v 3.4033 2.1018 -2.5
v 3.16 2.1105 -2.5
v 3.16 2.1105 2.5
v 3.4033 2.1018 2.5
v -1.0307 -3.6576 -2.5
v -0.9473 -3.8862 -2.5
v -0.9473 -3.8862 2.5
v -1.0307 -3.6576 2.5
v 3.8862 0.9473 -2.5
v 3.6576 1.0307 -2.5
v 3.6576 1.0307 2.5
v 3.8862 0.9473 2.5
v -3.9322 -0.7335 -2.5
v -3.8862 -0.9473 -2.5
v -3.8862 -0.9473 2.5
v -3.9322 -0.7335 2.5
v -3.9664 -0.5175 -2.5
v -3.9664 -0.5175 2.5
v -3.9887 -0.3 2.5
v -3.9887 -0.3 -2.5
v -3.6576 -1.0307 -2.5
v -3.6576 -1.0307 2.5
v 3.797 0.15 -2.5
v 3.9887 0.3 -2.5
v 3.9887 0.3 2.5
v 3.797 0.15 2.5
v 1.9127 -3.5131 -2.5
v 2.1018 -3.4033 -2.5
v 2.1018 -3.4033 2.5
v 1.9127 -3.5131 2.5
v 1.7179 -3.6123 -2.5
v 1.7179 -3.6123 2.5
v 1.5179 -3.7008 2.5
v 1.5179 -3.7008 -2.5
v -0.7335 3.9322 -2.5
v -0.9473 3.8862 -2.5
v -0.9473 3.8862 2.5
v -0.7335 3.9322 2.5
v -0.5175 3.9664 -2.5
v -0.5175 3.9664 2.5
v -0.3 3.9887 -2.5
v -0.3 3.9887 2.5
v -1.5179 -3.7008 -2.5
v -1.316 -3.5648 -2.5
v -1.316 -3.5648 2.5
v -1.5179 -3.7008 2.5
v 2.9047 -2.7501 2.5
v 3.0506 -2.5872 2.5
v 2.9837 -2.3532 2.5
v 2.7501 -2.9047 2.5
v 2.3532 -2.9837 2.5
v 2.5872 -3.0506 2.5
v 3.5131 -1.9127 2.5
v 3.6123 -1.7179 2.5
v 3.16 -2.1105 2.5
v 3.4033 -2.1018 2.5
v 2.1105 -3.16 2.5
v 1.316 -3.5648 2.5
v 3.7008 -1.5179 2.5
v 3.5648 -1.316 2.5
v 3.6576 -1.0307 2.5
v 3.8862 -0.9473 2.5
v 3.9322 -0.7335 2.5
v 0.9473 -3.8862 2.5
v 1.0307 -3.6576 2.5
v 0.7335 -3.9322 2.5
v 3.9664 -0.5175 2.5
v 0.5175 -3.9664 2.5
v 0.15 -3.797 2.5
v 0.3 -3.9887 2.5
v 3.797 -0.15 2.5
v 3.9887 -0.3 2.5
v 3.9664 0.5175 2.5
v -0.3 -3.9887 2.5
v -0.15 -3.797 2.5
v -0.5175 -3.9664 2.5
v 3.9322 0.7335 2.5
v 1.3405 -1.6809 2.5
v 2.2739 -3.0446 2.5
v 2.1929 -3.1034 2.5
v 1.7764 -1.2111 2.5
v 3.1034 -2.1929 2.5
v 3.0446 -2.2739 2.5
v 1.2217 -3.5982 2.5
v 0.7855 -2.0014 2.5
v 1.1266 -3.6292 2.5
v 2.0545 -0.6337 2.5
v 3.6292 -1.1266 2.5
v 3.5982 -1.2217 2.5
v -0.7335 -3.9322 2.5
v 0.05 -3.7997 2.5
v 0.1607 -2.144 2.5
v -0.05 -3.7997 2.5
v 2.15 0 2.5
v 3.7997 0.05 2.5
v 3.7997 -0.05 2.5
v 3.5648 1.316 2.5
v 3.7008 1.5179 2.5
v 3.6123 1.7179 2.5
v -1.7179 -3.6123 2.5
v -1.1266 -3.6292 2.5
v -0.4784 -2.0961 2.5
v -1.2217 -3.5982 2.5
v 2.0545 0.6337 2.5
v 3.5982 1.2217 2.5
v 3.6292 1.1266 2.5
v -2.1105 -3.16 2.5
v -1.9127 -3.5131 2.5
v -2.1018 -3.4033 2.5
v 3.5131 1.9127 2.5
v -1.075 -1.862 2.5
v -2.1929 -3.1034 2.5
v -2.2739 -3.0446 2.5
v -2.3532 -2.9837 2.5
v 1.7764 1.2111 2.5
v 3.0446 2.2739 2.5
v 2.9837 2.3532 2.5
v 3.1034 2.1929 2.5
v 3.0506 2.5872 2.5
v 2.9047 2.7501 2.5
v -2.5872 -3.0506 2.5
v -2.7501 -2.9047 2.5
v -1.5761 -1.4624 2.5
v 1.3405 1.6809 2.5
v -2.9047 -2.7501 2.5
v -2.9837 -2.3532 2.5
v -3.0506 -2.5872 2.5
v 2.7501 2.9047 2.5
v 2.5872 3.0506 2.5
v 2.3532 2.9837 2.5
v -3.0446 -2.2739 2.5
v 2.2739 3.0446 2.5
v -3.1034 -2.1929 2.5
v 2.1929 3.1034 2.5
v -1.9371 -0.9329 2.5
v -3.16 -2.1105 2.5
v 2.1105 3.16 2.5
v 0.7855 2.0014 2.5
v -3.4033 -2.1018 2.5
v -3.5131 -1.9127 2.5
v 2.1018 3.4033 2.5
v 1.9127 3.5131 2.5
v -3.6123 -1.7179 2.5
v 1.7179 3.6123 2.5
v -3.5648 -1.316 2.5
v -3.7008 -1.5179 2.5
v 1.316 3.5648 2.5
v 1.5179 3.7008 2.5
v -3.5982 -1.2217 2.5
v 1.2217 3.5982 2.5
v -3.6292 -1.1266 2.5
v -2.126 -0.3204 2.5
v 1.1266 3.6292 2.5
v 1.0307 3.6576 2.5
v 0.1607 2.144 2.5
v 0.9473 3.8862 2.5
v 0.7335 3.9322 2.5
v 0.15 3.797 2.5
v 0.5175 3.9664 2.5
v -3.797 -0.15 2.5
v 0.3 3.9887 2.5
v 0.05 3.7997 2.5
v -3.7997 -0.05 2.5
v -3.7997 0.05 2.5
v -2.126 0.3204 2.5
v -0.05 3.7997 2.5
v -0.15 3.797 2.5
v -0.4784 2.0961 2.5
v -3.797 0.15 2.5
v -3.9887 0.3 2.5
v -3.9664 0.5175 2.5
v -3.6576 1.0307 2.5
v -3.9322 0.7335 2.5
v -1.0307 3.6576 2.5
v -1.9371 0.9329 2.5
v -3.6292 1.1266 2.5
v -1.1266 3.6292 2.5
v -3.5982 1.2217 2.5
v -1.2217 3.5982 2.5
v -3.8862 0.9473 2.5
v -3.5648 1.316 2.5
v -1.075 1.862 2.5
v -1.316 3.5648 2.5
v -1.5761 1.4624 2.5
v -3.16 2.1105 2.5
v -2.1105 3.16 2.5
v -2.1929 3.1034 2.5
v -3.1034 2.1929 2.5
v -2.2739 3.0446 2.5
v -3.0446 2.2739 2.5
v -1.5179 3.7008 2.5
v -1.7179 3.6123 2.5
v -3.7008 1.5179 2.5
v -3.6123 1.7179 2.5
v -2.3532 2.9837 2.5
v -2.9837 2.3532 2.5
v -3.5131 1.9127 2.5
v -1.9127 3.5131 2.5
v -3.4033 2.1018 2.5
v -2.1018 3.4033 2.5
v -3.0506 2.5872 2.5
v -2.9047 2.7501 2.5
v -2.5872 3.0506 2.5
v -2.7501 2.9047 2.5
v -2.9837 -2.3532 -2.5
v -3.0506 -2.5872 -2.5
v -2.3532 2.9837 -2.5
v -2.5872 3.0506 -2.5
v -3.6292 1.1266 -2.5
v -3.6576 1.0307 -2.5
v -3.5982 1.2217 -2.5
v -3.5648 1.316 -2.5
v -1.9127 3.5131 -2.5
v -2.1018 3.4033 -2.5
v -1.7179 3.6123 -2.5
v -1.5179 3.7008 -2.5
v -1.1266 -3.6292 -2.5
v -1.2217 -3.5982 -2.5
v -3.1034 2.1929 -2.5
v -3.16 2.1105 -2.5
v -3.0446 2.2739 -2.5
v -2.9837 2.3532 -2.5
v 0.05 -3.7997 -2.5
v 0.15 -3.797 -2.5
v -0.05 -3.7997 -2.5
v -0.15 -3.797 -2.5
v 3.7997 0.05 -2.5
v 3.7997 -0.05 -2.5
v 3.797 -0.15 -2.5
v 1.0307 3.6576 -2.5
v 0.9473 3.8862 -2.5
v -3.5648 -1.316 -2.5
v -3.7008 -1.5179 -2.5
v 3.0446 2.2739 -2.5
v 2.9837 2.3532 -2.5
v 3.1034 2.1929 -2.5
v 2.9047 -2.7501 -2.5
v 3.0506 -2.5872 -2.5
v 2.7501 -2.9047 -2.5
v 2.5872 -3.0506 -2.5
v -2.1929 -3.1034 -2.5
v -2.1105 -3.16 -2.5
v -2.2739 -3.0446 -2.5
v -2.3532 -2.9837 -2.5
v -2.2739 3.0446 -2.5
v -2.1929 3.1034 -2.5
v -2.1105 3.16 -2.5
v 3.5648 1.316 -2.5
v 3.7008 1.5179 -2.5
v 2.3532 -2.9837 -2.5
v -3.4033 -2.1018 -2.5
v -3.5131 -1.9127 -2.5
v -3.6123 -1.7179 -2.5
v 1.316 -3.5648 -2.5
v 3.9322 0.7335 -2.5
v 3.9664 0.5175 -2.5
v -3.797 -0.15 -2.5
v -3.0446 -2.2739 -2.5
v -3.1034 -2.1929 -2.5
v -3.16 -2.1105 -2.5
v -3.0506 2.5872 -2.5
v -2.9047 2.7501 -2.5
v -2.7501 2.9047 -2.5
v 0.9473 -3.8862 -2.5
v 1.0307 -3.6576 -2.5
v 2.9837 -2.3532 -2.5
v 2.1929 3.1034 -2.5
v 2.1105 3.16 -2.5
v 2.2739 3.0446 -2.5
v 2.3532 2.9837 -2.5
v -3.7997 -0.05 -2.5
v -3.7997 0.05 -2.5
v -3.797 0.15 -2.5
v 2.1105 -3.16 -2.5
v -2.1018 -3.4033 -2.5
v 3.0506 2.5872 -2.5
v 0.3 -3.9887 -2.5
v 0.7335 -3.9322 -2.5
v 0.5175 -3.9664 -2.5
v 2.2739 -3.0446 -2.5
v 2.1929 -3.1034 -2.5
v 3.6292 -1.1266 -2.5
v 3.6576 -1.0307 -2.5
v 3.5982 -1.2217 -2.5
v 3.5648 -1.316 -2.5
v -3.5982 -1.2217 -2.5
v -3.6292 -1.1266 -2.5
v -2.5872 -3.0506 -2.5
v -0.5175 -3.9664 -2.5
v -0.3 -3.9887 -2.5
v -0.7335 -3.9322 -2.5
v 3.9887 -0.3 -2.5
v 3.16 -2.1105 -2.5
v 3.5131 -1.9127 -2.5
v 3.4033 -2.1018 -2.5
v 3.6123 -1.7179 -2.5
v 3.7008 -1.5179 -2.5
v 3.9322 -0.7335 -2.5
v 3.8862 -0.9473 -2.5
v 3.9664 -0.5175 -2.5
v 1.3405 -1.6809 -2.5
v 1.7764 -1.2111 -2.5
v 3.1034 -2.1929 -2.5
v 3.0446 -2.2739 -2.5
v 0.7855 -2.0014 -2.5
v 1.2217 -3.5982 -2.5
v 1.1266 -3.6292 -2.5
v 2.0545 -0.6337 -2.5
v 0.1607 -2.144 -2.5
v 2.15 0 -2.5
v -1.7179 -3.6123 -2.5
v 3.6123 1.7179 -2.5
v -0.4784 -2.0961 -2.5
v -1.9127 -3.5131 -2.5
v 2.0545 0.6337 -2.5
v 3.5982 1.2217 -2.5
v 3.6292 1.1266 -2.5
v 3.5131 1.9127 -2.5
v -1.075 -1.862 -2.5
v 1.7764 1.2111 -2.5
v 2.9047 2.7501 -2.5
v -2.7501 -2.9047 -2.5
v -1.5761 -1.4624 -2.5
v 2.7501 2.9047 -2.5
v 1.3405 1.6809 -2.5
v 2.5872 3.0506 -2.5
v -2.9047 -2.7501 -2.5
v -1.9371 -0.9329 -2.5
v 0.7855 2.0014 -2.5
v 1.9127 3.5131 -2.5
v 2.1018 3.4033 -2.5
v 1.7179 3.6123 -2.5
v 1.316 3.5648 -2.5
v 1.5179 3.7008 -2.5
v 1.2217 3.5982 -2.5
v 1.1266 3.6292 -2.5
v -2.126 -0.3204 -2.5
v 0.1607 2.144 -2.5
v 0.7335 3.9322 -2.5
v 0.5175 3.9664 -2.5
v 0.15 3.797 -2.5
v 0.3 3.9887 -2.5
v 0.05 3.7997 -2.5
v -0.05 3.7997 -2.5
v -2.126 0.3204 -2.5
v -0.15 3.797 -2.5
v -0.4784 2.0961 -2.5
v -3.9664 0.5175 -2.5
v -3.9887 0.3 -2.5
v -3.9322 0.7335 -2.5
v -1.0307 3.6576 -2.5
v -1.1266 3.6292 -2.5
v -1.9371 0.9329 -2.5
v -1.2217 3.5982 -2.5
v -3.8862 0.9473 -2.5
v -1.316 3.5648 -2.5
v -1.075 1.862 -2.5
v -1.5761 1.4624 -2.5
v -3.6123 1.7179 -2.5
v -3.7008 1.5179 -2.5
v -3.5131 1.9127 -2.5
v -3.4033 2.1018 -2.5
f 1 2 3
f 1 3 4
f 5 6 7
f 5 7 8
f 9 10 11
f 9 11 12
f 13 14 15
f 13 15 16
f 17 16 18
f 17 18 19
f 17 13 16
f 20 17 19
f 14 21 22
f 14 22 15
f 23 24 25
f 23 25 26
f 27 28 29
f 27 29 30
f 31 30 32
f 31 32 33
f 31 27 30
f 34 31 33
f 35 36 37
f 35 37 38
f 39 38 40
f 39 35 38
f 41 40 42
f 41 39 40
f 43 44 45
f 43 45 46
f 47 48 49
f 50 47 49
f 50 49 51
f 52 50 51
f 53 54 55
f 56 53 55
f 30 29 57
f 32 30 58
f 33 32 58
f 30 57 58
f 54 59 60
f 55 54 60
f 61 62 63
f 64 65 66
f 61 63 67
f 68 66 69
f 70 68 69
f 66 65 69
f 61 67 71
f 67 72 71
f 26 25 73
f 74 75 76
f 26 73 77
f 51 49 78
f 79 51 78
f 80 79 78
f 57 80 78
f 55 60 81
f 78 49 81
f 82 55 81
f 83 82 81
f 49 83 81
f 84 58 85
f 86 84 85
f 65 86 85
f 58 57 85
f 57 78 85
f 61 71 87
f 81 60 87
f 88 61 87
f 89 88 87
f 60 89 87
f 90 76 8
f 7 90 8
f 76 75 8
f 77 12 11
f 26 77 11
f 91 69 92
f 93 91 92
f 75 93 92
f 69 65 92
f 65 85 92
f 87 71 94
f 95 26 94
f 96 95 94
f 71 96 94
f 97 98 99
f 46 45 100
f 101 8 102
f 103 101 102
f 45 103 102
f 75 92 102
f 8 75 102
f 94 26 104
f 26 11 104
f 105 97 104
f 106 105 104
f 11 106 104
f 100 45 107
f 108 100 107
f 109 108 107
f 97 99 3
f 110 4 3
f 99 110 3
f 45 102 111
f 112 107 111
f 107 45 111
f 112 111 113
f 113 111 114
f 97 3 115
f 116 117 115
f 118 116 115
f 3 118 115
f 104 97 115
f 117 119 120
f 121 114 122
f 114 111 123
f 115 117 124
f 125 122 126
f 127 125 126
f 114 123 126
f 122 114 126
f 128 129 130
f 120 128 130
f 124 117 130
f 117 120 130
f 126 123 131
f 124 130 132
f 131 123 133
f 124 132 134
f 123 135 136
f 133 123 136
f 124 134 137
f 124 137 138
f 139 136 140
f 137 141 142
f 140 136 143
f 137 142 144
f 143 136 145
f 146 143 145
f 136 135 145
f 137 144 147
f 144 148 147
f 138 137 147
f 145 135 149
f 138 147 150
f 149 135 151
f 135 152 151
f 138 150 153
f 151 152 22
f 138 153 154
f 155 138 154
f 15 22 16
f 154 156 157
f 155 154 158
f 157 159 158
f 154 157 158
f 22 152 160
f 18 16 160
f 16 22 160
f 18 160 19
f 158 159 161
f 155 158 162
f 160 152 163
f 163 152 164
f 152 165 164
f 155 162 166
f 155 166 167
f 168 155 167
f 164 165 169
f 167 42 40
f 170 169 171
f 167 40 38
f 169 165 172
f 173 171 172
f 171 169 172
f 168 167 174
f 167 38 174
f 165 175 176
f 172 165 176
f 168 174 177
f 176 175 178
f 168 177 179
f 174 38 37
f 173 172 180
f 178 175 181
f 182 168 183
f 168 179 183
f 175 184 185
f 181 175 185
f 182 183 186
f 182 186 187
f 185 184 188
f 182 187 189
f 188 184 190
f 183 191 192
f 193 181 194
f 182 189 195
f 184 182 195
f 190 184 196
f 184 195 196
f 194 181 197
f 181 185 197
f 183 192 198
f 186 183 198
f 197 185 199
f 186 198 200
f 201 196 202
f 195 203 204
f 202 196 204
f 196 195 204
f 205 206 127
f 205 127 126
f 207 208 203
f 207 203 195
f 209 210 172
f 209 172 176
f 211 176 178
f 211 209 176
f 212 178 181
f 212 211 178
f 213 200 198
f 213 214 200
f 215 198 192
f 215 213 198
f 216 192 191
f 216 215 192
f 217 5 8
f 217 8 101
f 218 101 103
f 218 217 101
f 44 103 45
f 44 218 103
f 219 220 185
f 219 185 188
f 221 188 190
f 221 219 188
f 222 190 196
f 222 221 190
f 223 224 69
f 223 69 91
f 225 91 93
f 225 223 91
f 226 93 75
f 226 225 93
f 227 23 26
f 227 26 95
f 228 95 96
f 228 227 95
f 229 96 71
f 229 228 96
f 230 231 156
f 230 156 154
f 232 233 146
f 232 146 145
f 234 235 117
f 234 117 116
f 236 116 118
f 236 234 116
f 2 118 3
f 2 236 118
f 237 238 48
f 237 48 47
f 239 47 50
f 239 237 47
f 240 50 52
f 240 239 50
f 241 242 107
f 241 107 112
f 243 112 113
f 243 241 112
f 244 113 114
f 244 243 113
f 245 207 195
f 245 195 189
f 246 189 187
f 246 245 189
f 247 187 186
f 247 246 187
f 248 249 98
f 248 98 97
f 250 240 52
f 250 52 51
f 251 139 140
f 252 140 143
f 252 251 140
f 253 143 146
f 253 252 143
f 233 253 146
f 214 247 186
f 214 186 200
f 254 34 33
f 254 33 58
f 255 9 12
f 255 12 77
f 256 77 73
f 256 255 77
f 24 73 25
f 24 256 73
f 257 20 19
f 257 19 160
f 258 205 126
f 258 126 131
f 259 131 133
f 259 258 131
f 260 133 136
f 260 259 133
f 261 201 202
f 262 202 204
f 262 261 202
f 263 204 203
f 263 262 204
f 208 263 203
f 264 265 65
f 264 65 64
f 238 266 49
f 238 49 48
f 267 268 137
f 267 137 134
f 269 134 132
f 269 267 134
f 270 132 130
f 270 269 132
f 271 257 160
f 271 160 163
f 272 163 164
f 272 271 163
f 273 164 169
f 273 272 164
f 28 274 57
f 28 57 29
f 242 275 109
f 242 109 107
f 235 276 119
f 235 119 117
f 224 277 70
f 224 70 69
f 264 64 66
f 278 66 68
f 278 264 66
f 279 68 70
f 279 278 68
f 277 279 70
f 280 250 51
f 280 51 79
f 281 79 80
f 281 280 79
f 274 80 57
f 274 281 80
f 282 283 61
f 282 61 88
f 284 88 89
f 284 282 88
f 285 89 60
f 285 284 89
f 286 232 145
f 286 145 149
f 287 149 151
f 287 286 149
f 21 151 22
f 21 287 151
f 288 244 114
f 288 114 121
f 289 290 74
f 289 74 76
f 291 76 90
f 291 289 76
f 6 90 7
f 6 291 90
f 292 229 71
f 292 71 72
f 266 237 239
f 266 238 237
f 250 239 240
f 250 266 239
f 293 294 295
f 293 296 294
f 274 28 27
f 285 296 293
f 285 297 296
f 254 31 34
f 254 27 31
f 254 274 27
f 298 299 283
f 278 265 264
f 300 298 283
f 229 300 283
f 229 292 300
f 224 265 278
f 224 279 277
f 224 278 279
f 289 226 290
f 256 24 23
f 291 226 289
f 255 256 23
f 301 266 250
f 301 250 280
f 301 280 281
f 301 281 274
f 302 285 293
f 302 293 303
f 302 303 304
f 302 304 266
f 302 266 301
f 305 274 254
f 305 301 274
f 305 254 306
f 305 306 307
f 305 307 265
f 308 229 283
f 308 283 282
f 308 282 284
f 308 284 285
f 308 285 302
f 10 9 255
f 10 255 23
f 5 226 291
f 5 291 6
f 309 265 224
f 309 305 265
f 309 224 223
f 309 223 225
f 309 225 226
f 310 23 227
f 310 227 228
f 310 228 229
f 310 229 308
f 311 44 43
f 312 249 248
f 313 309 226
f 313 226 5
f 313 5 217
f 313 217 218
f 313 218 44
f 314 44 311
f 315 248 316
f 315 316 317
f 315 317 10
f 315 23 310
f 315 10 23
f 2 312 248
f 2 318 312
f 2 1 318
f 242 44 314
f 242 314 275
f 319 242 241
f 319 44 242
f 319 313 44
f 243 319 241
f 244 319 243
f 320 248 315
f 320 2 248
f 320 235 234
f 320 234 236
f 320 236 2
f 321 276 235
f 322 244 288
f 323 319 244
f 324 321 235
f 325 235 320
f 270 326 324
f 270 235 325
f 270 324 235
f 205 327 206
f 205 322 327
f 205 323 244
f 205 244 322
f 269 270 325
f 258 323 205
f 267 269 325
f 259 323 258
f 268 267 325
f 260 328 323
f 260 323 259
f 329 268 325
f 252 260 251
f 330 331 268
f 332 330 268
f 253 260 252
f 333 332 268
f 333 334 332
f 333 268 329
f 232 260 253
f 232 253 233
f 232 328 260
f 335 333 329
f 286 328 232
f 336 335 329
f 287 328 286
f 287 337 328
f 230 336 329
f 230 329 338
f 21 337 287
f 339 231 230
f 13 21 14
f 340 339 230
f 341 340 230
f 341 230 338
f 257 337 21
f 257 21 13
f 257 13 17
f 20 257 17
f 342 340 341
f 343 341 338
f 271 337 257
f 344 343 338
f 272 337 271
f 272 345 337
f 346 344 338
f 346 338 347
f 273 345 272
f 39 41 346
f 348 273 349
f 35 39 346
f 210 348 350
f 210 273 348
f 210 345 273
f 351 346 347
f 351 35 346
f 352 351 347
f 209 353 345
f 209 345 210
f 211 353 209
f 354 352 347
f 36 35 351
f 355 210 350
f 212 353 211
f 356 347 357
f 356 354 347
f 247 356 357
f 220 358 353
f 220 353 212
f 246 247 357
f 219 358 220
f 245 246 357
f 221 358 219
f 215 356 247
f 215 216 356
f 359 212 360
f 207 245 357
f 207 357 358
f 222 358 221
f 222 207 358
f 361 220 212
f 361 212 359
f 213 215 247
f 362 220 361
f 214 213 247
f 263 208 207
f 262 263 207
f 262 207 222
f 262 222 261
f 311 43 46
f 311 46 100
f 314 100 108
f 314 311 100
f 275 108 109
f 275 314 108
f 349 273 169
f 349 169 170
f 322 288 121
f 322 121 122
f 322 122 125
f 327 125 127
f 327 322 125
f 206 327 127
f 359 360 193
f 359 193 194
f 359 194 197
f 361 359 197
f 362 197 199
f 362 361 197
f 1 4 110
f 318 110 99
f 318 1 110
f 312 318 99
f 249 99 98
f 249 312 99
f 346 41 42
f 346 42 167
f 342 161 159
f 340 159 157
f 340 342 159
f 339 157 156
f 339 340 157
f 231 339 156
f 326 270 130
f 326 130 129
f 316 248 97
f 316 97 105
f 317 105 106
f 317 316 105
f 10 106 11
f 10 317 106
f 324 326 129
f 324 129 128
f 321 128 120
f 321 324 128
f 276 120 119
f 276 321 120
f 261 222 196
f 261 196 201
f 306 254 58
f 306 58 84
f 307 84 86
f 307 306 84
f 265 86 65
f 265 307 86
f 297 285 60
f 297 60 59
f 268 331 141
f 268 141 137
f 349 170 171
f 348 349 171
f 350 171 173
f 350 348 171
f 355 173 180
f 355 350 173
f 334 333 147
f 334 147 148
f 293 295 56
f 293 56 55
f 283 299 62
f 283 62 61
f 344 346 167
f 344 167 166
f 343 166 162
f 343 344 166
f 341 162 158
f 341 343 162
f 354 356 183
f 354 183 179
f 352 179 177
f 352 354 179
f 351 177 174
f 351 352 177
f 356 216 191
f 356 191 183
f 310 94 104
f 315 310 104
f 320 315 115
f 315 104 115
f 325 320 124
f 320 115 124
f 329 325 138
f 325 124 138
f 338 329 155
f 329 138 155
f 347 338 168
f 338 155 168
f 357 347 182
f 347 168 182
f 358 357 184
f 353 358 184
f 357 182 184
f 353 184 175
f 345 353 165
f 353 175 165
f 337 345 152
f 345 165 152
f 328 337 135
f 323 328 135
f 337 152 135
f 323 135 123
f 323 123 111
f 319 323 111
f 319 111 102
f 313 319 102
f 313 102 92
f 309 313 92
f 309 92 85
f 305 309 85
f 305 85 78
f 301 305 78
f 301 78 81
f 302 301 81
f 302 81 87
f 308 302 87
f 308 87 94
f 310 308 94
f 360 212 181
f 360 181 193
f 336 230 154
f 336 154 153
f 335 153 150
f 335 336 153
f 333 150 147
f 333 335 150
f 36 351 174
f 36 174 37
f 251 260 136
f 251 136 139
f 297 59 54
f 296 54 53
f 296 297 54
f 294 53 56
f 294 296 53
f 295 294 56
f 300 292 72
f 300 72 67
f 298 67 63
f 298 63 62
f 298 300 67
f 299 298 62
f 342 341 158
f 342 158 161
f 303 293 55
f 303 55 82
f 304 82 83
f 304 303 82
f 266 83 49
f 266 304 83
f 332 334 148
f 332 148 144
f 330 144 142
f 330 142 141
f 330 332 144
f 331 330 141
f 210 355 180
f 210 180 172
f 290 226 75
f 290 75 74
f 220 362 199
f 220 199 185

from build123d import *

# Parameters (mm, degrees)
BODYS_R                = 4
BODY_DEPTH             = 2.5
ENGAGEMENTCUT_DEPTH    = 7.184658438
ECCP_COUNT             = 20
MAJORDIAMETERCUTS_R    = 2.15
MAJORDIAMETERCUT_DEPTH = 8.537904218


with BuildPart() as part:
    # BodyS → Body (new, symmetric)
    with BuildSketch(Plane(origin=(0, 0, 0), x_dir=(-1, 0, 0), z_dir=(0, 0, -1))):
        Circle(BODYS_R)
    extrude(amount=BODY_DEPTH, both=True)

    # EngagementCutS → EngagementCut (cut, symmetric)
    with BuildSketch(Plane(origin=(0, 0, 0), x_dir=(-1, 0, 0), z_dir=(0, 0, -1))):
        with BuildLine():
            Line((0.3, 3.988734135), (0.15, 3.79703832))
            ThreePointArc((0.15, 3.79703832), (0, 3.8), (-0.15, 3.79703832))
            Line((-0.15, 3.79703832), (-0.3, 3.988734135))
            ThreePointArc((-0.3, 3.988734135), (0, 4), (0.3, 3.988734135))
        make_face()
    engagementcut = extrude(amount=ENGAGEMENTCUT_DEPTH, both=True, mode=Mode.SUBTRACT)

    # ECCP: EngagementCut ×20 about axis
    eccp_axis = Axis((0, 0, 51.25), (0, 0, -1))
    for i in range(1, ECCP_COUNT):
        add(engagementcut.rotate(eccp_axis, i * 360 / ECCP_COUNT), mode=Mode.SUBTRACT)

    # MajorDiameterCutS → MajorDiameterCut (cut, through all)
    with BuildSketch(Plane.XY.offset(2.5)):
        Circle(MAJORDIAMETERCUTS_R)
    extrude(amount=-MAJORDIAMETERCUT_DEPTH, mode=Mode.SUBTRACT)


solid = part.part
